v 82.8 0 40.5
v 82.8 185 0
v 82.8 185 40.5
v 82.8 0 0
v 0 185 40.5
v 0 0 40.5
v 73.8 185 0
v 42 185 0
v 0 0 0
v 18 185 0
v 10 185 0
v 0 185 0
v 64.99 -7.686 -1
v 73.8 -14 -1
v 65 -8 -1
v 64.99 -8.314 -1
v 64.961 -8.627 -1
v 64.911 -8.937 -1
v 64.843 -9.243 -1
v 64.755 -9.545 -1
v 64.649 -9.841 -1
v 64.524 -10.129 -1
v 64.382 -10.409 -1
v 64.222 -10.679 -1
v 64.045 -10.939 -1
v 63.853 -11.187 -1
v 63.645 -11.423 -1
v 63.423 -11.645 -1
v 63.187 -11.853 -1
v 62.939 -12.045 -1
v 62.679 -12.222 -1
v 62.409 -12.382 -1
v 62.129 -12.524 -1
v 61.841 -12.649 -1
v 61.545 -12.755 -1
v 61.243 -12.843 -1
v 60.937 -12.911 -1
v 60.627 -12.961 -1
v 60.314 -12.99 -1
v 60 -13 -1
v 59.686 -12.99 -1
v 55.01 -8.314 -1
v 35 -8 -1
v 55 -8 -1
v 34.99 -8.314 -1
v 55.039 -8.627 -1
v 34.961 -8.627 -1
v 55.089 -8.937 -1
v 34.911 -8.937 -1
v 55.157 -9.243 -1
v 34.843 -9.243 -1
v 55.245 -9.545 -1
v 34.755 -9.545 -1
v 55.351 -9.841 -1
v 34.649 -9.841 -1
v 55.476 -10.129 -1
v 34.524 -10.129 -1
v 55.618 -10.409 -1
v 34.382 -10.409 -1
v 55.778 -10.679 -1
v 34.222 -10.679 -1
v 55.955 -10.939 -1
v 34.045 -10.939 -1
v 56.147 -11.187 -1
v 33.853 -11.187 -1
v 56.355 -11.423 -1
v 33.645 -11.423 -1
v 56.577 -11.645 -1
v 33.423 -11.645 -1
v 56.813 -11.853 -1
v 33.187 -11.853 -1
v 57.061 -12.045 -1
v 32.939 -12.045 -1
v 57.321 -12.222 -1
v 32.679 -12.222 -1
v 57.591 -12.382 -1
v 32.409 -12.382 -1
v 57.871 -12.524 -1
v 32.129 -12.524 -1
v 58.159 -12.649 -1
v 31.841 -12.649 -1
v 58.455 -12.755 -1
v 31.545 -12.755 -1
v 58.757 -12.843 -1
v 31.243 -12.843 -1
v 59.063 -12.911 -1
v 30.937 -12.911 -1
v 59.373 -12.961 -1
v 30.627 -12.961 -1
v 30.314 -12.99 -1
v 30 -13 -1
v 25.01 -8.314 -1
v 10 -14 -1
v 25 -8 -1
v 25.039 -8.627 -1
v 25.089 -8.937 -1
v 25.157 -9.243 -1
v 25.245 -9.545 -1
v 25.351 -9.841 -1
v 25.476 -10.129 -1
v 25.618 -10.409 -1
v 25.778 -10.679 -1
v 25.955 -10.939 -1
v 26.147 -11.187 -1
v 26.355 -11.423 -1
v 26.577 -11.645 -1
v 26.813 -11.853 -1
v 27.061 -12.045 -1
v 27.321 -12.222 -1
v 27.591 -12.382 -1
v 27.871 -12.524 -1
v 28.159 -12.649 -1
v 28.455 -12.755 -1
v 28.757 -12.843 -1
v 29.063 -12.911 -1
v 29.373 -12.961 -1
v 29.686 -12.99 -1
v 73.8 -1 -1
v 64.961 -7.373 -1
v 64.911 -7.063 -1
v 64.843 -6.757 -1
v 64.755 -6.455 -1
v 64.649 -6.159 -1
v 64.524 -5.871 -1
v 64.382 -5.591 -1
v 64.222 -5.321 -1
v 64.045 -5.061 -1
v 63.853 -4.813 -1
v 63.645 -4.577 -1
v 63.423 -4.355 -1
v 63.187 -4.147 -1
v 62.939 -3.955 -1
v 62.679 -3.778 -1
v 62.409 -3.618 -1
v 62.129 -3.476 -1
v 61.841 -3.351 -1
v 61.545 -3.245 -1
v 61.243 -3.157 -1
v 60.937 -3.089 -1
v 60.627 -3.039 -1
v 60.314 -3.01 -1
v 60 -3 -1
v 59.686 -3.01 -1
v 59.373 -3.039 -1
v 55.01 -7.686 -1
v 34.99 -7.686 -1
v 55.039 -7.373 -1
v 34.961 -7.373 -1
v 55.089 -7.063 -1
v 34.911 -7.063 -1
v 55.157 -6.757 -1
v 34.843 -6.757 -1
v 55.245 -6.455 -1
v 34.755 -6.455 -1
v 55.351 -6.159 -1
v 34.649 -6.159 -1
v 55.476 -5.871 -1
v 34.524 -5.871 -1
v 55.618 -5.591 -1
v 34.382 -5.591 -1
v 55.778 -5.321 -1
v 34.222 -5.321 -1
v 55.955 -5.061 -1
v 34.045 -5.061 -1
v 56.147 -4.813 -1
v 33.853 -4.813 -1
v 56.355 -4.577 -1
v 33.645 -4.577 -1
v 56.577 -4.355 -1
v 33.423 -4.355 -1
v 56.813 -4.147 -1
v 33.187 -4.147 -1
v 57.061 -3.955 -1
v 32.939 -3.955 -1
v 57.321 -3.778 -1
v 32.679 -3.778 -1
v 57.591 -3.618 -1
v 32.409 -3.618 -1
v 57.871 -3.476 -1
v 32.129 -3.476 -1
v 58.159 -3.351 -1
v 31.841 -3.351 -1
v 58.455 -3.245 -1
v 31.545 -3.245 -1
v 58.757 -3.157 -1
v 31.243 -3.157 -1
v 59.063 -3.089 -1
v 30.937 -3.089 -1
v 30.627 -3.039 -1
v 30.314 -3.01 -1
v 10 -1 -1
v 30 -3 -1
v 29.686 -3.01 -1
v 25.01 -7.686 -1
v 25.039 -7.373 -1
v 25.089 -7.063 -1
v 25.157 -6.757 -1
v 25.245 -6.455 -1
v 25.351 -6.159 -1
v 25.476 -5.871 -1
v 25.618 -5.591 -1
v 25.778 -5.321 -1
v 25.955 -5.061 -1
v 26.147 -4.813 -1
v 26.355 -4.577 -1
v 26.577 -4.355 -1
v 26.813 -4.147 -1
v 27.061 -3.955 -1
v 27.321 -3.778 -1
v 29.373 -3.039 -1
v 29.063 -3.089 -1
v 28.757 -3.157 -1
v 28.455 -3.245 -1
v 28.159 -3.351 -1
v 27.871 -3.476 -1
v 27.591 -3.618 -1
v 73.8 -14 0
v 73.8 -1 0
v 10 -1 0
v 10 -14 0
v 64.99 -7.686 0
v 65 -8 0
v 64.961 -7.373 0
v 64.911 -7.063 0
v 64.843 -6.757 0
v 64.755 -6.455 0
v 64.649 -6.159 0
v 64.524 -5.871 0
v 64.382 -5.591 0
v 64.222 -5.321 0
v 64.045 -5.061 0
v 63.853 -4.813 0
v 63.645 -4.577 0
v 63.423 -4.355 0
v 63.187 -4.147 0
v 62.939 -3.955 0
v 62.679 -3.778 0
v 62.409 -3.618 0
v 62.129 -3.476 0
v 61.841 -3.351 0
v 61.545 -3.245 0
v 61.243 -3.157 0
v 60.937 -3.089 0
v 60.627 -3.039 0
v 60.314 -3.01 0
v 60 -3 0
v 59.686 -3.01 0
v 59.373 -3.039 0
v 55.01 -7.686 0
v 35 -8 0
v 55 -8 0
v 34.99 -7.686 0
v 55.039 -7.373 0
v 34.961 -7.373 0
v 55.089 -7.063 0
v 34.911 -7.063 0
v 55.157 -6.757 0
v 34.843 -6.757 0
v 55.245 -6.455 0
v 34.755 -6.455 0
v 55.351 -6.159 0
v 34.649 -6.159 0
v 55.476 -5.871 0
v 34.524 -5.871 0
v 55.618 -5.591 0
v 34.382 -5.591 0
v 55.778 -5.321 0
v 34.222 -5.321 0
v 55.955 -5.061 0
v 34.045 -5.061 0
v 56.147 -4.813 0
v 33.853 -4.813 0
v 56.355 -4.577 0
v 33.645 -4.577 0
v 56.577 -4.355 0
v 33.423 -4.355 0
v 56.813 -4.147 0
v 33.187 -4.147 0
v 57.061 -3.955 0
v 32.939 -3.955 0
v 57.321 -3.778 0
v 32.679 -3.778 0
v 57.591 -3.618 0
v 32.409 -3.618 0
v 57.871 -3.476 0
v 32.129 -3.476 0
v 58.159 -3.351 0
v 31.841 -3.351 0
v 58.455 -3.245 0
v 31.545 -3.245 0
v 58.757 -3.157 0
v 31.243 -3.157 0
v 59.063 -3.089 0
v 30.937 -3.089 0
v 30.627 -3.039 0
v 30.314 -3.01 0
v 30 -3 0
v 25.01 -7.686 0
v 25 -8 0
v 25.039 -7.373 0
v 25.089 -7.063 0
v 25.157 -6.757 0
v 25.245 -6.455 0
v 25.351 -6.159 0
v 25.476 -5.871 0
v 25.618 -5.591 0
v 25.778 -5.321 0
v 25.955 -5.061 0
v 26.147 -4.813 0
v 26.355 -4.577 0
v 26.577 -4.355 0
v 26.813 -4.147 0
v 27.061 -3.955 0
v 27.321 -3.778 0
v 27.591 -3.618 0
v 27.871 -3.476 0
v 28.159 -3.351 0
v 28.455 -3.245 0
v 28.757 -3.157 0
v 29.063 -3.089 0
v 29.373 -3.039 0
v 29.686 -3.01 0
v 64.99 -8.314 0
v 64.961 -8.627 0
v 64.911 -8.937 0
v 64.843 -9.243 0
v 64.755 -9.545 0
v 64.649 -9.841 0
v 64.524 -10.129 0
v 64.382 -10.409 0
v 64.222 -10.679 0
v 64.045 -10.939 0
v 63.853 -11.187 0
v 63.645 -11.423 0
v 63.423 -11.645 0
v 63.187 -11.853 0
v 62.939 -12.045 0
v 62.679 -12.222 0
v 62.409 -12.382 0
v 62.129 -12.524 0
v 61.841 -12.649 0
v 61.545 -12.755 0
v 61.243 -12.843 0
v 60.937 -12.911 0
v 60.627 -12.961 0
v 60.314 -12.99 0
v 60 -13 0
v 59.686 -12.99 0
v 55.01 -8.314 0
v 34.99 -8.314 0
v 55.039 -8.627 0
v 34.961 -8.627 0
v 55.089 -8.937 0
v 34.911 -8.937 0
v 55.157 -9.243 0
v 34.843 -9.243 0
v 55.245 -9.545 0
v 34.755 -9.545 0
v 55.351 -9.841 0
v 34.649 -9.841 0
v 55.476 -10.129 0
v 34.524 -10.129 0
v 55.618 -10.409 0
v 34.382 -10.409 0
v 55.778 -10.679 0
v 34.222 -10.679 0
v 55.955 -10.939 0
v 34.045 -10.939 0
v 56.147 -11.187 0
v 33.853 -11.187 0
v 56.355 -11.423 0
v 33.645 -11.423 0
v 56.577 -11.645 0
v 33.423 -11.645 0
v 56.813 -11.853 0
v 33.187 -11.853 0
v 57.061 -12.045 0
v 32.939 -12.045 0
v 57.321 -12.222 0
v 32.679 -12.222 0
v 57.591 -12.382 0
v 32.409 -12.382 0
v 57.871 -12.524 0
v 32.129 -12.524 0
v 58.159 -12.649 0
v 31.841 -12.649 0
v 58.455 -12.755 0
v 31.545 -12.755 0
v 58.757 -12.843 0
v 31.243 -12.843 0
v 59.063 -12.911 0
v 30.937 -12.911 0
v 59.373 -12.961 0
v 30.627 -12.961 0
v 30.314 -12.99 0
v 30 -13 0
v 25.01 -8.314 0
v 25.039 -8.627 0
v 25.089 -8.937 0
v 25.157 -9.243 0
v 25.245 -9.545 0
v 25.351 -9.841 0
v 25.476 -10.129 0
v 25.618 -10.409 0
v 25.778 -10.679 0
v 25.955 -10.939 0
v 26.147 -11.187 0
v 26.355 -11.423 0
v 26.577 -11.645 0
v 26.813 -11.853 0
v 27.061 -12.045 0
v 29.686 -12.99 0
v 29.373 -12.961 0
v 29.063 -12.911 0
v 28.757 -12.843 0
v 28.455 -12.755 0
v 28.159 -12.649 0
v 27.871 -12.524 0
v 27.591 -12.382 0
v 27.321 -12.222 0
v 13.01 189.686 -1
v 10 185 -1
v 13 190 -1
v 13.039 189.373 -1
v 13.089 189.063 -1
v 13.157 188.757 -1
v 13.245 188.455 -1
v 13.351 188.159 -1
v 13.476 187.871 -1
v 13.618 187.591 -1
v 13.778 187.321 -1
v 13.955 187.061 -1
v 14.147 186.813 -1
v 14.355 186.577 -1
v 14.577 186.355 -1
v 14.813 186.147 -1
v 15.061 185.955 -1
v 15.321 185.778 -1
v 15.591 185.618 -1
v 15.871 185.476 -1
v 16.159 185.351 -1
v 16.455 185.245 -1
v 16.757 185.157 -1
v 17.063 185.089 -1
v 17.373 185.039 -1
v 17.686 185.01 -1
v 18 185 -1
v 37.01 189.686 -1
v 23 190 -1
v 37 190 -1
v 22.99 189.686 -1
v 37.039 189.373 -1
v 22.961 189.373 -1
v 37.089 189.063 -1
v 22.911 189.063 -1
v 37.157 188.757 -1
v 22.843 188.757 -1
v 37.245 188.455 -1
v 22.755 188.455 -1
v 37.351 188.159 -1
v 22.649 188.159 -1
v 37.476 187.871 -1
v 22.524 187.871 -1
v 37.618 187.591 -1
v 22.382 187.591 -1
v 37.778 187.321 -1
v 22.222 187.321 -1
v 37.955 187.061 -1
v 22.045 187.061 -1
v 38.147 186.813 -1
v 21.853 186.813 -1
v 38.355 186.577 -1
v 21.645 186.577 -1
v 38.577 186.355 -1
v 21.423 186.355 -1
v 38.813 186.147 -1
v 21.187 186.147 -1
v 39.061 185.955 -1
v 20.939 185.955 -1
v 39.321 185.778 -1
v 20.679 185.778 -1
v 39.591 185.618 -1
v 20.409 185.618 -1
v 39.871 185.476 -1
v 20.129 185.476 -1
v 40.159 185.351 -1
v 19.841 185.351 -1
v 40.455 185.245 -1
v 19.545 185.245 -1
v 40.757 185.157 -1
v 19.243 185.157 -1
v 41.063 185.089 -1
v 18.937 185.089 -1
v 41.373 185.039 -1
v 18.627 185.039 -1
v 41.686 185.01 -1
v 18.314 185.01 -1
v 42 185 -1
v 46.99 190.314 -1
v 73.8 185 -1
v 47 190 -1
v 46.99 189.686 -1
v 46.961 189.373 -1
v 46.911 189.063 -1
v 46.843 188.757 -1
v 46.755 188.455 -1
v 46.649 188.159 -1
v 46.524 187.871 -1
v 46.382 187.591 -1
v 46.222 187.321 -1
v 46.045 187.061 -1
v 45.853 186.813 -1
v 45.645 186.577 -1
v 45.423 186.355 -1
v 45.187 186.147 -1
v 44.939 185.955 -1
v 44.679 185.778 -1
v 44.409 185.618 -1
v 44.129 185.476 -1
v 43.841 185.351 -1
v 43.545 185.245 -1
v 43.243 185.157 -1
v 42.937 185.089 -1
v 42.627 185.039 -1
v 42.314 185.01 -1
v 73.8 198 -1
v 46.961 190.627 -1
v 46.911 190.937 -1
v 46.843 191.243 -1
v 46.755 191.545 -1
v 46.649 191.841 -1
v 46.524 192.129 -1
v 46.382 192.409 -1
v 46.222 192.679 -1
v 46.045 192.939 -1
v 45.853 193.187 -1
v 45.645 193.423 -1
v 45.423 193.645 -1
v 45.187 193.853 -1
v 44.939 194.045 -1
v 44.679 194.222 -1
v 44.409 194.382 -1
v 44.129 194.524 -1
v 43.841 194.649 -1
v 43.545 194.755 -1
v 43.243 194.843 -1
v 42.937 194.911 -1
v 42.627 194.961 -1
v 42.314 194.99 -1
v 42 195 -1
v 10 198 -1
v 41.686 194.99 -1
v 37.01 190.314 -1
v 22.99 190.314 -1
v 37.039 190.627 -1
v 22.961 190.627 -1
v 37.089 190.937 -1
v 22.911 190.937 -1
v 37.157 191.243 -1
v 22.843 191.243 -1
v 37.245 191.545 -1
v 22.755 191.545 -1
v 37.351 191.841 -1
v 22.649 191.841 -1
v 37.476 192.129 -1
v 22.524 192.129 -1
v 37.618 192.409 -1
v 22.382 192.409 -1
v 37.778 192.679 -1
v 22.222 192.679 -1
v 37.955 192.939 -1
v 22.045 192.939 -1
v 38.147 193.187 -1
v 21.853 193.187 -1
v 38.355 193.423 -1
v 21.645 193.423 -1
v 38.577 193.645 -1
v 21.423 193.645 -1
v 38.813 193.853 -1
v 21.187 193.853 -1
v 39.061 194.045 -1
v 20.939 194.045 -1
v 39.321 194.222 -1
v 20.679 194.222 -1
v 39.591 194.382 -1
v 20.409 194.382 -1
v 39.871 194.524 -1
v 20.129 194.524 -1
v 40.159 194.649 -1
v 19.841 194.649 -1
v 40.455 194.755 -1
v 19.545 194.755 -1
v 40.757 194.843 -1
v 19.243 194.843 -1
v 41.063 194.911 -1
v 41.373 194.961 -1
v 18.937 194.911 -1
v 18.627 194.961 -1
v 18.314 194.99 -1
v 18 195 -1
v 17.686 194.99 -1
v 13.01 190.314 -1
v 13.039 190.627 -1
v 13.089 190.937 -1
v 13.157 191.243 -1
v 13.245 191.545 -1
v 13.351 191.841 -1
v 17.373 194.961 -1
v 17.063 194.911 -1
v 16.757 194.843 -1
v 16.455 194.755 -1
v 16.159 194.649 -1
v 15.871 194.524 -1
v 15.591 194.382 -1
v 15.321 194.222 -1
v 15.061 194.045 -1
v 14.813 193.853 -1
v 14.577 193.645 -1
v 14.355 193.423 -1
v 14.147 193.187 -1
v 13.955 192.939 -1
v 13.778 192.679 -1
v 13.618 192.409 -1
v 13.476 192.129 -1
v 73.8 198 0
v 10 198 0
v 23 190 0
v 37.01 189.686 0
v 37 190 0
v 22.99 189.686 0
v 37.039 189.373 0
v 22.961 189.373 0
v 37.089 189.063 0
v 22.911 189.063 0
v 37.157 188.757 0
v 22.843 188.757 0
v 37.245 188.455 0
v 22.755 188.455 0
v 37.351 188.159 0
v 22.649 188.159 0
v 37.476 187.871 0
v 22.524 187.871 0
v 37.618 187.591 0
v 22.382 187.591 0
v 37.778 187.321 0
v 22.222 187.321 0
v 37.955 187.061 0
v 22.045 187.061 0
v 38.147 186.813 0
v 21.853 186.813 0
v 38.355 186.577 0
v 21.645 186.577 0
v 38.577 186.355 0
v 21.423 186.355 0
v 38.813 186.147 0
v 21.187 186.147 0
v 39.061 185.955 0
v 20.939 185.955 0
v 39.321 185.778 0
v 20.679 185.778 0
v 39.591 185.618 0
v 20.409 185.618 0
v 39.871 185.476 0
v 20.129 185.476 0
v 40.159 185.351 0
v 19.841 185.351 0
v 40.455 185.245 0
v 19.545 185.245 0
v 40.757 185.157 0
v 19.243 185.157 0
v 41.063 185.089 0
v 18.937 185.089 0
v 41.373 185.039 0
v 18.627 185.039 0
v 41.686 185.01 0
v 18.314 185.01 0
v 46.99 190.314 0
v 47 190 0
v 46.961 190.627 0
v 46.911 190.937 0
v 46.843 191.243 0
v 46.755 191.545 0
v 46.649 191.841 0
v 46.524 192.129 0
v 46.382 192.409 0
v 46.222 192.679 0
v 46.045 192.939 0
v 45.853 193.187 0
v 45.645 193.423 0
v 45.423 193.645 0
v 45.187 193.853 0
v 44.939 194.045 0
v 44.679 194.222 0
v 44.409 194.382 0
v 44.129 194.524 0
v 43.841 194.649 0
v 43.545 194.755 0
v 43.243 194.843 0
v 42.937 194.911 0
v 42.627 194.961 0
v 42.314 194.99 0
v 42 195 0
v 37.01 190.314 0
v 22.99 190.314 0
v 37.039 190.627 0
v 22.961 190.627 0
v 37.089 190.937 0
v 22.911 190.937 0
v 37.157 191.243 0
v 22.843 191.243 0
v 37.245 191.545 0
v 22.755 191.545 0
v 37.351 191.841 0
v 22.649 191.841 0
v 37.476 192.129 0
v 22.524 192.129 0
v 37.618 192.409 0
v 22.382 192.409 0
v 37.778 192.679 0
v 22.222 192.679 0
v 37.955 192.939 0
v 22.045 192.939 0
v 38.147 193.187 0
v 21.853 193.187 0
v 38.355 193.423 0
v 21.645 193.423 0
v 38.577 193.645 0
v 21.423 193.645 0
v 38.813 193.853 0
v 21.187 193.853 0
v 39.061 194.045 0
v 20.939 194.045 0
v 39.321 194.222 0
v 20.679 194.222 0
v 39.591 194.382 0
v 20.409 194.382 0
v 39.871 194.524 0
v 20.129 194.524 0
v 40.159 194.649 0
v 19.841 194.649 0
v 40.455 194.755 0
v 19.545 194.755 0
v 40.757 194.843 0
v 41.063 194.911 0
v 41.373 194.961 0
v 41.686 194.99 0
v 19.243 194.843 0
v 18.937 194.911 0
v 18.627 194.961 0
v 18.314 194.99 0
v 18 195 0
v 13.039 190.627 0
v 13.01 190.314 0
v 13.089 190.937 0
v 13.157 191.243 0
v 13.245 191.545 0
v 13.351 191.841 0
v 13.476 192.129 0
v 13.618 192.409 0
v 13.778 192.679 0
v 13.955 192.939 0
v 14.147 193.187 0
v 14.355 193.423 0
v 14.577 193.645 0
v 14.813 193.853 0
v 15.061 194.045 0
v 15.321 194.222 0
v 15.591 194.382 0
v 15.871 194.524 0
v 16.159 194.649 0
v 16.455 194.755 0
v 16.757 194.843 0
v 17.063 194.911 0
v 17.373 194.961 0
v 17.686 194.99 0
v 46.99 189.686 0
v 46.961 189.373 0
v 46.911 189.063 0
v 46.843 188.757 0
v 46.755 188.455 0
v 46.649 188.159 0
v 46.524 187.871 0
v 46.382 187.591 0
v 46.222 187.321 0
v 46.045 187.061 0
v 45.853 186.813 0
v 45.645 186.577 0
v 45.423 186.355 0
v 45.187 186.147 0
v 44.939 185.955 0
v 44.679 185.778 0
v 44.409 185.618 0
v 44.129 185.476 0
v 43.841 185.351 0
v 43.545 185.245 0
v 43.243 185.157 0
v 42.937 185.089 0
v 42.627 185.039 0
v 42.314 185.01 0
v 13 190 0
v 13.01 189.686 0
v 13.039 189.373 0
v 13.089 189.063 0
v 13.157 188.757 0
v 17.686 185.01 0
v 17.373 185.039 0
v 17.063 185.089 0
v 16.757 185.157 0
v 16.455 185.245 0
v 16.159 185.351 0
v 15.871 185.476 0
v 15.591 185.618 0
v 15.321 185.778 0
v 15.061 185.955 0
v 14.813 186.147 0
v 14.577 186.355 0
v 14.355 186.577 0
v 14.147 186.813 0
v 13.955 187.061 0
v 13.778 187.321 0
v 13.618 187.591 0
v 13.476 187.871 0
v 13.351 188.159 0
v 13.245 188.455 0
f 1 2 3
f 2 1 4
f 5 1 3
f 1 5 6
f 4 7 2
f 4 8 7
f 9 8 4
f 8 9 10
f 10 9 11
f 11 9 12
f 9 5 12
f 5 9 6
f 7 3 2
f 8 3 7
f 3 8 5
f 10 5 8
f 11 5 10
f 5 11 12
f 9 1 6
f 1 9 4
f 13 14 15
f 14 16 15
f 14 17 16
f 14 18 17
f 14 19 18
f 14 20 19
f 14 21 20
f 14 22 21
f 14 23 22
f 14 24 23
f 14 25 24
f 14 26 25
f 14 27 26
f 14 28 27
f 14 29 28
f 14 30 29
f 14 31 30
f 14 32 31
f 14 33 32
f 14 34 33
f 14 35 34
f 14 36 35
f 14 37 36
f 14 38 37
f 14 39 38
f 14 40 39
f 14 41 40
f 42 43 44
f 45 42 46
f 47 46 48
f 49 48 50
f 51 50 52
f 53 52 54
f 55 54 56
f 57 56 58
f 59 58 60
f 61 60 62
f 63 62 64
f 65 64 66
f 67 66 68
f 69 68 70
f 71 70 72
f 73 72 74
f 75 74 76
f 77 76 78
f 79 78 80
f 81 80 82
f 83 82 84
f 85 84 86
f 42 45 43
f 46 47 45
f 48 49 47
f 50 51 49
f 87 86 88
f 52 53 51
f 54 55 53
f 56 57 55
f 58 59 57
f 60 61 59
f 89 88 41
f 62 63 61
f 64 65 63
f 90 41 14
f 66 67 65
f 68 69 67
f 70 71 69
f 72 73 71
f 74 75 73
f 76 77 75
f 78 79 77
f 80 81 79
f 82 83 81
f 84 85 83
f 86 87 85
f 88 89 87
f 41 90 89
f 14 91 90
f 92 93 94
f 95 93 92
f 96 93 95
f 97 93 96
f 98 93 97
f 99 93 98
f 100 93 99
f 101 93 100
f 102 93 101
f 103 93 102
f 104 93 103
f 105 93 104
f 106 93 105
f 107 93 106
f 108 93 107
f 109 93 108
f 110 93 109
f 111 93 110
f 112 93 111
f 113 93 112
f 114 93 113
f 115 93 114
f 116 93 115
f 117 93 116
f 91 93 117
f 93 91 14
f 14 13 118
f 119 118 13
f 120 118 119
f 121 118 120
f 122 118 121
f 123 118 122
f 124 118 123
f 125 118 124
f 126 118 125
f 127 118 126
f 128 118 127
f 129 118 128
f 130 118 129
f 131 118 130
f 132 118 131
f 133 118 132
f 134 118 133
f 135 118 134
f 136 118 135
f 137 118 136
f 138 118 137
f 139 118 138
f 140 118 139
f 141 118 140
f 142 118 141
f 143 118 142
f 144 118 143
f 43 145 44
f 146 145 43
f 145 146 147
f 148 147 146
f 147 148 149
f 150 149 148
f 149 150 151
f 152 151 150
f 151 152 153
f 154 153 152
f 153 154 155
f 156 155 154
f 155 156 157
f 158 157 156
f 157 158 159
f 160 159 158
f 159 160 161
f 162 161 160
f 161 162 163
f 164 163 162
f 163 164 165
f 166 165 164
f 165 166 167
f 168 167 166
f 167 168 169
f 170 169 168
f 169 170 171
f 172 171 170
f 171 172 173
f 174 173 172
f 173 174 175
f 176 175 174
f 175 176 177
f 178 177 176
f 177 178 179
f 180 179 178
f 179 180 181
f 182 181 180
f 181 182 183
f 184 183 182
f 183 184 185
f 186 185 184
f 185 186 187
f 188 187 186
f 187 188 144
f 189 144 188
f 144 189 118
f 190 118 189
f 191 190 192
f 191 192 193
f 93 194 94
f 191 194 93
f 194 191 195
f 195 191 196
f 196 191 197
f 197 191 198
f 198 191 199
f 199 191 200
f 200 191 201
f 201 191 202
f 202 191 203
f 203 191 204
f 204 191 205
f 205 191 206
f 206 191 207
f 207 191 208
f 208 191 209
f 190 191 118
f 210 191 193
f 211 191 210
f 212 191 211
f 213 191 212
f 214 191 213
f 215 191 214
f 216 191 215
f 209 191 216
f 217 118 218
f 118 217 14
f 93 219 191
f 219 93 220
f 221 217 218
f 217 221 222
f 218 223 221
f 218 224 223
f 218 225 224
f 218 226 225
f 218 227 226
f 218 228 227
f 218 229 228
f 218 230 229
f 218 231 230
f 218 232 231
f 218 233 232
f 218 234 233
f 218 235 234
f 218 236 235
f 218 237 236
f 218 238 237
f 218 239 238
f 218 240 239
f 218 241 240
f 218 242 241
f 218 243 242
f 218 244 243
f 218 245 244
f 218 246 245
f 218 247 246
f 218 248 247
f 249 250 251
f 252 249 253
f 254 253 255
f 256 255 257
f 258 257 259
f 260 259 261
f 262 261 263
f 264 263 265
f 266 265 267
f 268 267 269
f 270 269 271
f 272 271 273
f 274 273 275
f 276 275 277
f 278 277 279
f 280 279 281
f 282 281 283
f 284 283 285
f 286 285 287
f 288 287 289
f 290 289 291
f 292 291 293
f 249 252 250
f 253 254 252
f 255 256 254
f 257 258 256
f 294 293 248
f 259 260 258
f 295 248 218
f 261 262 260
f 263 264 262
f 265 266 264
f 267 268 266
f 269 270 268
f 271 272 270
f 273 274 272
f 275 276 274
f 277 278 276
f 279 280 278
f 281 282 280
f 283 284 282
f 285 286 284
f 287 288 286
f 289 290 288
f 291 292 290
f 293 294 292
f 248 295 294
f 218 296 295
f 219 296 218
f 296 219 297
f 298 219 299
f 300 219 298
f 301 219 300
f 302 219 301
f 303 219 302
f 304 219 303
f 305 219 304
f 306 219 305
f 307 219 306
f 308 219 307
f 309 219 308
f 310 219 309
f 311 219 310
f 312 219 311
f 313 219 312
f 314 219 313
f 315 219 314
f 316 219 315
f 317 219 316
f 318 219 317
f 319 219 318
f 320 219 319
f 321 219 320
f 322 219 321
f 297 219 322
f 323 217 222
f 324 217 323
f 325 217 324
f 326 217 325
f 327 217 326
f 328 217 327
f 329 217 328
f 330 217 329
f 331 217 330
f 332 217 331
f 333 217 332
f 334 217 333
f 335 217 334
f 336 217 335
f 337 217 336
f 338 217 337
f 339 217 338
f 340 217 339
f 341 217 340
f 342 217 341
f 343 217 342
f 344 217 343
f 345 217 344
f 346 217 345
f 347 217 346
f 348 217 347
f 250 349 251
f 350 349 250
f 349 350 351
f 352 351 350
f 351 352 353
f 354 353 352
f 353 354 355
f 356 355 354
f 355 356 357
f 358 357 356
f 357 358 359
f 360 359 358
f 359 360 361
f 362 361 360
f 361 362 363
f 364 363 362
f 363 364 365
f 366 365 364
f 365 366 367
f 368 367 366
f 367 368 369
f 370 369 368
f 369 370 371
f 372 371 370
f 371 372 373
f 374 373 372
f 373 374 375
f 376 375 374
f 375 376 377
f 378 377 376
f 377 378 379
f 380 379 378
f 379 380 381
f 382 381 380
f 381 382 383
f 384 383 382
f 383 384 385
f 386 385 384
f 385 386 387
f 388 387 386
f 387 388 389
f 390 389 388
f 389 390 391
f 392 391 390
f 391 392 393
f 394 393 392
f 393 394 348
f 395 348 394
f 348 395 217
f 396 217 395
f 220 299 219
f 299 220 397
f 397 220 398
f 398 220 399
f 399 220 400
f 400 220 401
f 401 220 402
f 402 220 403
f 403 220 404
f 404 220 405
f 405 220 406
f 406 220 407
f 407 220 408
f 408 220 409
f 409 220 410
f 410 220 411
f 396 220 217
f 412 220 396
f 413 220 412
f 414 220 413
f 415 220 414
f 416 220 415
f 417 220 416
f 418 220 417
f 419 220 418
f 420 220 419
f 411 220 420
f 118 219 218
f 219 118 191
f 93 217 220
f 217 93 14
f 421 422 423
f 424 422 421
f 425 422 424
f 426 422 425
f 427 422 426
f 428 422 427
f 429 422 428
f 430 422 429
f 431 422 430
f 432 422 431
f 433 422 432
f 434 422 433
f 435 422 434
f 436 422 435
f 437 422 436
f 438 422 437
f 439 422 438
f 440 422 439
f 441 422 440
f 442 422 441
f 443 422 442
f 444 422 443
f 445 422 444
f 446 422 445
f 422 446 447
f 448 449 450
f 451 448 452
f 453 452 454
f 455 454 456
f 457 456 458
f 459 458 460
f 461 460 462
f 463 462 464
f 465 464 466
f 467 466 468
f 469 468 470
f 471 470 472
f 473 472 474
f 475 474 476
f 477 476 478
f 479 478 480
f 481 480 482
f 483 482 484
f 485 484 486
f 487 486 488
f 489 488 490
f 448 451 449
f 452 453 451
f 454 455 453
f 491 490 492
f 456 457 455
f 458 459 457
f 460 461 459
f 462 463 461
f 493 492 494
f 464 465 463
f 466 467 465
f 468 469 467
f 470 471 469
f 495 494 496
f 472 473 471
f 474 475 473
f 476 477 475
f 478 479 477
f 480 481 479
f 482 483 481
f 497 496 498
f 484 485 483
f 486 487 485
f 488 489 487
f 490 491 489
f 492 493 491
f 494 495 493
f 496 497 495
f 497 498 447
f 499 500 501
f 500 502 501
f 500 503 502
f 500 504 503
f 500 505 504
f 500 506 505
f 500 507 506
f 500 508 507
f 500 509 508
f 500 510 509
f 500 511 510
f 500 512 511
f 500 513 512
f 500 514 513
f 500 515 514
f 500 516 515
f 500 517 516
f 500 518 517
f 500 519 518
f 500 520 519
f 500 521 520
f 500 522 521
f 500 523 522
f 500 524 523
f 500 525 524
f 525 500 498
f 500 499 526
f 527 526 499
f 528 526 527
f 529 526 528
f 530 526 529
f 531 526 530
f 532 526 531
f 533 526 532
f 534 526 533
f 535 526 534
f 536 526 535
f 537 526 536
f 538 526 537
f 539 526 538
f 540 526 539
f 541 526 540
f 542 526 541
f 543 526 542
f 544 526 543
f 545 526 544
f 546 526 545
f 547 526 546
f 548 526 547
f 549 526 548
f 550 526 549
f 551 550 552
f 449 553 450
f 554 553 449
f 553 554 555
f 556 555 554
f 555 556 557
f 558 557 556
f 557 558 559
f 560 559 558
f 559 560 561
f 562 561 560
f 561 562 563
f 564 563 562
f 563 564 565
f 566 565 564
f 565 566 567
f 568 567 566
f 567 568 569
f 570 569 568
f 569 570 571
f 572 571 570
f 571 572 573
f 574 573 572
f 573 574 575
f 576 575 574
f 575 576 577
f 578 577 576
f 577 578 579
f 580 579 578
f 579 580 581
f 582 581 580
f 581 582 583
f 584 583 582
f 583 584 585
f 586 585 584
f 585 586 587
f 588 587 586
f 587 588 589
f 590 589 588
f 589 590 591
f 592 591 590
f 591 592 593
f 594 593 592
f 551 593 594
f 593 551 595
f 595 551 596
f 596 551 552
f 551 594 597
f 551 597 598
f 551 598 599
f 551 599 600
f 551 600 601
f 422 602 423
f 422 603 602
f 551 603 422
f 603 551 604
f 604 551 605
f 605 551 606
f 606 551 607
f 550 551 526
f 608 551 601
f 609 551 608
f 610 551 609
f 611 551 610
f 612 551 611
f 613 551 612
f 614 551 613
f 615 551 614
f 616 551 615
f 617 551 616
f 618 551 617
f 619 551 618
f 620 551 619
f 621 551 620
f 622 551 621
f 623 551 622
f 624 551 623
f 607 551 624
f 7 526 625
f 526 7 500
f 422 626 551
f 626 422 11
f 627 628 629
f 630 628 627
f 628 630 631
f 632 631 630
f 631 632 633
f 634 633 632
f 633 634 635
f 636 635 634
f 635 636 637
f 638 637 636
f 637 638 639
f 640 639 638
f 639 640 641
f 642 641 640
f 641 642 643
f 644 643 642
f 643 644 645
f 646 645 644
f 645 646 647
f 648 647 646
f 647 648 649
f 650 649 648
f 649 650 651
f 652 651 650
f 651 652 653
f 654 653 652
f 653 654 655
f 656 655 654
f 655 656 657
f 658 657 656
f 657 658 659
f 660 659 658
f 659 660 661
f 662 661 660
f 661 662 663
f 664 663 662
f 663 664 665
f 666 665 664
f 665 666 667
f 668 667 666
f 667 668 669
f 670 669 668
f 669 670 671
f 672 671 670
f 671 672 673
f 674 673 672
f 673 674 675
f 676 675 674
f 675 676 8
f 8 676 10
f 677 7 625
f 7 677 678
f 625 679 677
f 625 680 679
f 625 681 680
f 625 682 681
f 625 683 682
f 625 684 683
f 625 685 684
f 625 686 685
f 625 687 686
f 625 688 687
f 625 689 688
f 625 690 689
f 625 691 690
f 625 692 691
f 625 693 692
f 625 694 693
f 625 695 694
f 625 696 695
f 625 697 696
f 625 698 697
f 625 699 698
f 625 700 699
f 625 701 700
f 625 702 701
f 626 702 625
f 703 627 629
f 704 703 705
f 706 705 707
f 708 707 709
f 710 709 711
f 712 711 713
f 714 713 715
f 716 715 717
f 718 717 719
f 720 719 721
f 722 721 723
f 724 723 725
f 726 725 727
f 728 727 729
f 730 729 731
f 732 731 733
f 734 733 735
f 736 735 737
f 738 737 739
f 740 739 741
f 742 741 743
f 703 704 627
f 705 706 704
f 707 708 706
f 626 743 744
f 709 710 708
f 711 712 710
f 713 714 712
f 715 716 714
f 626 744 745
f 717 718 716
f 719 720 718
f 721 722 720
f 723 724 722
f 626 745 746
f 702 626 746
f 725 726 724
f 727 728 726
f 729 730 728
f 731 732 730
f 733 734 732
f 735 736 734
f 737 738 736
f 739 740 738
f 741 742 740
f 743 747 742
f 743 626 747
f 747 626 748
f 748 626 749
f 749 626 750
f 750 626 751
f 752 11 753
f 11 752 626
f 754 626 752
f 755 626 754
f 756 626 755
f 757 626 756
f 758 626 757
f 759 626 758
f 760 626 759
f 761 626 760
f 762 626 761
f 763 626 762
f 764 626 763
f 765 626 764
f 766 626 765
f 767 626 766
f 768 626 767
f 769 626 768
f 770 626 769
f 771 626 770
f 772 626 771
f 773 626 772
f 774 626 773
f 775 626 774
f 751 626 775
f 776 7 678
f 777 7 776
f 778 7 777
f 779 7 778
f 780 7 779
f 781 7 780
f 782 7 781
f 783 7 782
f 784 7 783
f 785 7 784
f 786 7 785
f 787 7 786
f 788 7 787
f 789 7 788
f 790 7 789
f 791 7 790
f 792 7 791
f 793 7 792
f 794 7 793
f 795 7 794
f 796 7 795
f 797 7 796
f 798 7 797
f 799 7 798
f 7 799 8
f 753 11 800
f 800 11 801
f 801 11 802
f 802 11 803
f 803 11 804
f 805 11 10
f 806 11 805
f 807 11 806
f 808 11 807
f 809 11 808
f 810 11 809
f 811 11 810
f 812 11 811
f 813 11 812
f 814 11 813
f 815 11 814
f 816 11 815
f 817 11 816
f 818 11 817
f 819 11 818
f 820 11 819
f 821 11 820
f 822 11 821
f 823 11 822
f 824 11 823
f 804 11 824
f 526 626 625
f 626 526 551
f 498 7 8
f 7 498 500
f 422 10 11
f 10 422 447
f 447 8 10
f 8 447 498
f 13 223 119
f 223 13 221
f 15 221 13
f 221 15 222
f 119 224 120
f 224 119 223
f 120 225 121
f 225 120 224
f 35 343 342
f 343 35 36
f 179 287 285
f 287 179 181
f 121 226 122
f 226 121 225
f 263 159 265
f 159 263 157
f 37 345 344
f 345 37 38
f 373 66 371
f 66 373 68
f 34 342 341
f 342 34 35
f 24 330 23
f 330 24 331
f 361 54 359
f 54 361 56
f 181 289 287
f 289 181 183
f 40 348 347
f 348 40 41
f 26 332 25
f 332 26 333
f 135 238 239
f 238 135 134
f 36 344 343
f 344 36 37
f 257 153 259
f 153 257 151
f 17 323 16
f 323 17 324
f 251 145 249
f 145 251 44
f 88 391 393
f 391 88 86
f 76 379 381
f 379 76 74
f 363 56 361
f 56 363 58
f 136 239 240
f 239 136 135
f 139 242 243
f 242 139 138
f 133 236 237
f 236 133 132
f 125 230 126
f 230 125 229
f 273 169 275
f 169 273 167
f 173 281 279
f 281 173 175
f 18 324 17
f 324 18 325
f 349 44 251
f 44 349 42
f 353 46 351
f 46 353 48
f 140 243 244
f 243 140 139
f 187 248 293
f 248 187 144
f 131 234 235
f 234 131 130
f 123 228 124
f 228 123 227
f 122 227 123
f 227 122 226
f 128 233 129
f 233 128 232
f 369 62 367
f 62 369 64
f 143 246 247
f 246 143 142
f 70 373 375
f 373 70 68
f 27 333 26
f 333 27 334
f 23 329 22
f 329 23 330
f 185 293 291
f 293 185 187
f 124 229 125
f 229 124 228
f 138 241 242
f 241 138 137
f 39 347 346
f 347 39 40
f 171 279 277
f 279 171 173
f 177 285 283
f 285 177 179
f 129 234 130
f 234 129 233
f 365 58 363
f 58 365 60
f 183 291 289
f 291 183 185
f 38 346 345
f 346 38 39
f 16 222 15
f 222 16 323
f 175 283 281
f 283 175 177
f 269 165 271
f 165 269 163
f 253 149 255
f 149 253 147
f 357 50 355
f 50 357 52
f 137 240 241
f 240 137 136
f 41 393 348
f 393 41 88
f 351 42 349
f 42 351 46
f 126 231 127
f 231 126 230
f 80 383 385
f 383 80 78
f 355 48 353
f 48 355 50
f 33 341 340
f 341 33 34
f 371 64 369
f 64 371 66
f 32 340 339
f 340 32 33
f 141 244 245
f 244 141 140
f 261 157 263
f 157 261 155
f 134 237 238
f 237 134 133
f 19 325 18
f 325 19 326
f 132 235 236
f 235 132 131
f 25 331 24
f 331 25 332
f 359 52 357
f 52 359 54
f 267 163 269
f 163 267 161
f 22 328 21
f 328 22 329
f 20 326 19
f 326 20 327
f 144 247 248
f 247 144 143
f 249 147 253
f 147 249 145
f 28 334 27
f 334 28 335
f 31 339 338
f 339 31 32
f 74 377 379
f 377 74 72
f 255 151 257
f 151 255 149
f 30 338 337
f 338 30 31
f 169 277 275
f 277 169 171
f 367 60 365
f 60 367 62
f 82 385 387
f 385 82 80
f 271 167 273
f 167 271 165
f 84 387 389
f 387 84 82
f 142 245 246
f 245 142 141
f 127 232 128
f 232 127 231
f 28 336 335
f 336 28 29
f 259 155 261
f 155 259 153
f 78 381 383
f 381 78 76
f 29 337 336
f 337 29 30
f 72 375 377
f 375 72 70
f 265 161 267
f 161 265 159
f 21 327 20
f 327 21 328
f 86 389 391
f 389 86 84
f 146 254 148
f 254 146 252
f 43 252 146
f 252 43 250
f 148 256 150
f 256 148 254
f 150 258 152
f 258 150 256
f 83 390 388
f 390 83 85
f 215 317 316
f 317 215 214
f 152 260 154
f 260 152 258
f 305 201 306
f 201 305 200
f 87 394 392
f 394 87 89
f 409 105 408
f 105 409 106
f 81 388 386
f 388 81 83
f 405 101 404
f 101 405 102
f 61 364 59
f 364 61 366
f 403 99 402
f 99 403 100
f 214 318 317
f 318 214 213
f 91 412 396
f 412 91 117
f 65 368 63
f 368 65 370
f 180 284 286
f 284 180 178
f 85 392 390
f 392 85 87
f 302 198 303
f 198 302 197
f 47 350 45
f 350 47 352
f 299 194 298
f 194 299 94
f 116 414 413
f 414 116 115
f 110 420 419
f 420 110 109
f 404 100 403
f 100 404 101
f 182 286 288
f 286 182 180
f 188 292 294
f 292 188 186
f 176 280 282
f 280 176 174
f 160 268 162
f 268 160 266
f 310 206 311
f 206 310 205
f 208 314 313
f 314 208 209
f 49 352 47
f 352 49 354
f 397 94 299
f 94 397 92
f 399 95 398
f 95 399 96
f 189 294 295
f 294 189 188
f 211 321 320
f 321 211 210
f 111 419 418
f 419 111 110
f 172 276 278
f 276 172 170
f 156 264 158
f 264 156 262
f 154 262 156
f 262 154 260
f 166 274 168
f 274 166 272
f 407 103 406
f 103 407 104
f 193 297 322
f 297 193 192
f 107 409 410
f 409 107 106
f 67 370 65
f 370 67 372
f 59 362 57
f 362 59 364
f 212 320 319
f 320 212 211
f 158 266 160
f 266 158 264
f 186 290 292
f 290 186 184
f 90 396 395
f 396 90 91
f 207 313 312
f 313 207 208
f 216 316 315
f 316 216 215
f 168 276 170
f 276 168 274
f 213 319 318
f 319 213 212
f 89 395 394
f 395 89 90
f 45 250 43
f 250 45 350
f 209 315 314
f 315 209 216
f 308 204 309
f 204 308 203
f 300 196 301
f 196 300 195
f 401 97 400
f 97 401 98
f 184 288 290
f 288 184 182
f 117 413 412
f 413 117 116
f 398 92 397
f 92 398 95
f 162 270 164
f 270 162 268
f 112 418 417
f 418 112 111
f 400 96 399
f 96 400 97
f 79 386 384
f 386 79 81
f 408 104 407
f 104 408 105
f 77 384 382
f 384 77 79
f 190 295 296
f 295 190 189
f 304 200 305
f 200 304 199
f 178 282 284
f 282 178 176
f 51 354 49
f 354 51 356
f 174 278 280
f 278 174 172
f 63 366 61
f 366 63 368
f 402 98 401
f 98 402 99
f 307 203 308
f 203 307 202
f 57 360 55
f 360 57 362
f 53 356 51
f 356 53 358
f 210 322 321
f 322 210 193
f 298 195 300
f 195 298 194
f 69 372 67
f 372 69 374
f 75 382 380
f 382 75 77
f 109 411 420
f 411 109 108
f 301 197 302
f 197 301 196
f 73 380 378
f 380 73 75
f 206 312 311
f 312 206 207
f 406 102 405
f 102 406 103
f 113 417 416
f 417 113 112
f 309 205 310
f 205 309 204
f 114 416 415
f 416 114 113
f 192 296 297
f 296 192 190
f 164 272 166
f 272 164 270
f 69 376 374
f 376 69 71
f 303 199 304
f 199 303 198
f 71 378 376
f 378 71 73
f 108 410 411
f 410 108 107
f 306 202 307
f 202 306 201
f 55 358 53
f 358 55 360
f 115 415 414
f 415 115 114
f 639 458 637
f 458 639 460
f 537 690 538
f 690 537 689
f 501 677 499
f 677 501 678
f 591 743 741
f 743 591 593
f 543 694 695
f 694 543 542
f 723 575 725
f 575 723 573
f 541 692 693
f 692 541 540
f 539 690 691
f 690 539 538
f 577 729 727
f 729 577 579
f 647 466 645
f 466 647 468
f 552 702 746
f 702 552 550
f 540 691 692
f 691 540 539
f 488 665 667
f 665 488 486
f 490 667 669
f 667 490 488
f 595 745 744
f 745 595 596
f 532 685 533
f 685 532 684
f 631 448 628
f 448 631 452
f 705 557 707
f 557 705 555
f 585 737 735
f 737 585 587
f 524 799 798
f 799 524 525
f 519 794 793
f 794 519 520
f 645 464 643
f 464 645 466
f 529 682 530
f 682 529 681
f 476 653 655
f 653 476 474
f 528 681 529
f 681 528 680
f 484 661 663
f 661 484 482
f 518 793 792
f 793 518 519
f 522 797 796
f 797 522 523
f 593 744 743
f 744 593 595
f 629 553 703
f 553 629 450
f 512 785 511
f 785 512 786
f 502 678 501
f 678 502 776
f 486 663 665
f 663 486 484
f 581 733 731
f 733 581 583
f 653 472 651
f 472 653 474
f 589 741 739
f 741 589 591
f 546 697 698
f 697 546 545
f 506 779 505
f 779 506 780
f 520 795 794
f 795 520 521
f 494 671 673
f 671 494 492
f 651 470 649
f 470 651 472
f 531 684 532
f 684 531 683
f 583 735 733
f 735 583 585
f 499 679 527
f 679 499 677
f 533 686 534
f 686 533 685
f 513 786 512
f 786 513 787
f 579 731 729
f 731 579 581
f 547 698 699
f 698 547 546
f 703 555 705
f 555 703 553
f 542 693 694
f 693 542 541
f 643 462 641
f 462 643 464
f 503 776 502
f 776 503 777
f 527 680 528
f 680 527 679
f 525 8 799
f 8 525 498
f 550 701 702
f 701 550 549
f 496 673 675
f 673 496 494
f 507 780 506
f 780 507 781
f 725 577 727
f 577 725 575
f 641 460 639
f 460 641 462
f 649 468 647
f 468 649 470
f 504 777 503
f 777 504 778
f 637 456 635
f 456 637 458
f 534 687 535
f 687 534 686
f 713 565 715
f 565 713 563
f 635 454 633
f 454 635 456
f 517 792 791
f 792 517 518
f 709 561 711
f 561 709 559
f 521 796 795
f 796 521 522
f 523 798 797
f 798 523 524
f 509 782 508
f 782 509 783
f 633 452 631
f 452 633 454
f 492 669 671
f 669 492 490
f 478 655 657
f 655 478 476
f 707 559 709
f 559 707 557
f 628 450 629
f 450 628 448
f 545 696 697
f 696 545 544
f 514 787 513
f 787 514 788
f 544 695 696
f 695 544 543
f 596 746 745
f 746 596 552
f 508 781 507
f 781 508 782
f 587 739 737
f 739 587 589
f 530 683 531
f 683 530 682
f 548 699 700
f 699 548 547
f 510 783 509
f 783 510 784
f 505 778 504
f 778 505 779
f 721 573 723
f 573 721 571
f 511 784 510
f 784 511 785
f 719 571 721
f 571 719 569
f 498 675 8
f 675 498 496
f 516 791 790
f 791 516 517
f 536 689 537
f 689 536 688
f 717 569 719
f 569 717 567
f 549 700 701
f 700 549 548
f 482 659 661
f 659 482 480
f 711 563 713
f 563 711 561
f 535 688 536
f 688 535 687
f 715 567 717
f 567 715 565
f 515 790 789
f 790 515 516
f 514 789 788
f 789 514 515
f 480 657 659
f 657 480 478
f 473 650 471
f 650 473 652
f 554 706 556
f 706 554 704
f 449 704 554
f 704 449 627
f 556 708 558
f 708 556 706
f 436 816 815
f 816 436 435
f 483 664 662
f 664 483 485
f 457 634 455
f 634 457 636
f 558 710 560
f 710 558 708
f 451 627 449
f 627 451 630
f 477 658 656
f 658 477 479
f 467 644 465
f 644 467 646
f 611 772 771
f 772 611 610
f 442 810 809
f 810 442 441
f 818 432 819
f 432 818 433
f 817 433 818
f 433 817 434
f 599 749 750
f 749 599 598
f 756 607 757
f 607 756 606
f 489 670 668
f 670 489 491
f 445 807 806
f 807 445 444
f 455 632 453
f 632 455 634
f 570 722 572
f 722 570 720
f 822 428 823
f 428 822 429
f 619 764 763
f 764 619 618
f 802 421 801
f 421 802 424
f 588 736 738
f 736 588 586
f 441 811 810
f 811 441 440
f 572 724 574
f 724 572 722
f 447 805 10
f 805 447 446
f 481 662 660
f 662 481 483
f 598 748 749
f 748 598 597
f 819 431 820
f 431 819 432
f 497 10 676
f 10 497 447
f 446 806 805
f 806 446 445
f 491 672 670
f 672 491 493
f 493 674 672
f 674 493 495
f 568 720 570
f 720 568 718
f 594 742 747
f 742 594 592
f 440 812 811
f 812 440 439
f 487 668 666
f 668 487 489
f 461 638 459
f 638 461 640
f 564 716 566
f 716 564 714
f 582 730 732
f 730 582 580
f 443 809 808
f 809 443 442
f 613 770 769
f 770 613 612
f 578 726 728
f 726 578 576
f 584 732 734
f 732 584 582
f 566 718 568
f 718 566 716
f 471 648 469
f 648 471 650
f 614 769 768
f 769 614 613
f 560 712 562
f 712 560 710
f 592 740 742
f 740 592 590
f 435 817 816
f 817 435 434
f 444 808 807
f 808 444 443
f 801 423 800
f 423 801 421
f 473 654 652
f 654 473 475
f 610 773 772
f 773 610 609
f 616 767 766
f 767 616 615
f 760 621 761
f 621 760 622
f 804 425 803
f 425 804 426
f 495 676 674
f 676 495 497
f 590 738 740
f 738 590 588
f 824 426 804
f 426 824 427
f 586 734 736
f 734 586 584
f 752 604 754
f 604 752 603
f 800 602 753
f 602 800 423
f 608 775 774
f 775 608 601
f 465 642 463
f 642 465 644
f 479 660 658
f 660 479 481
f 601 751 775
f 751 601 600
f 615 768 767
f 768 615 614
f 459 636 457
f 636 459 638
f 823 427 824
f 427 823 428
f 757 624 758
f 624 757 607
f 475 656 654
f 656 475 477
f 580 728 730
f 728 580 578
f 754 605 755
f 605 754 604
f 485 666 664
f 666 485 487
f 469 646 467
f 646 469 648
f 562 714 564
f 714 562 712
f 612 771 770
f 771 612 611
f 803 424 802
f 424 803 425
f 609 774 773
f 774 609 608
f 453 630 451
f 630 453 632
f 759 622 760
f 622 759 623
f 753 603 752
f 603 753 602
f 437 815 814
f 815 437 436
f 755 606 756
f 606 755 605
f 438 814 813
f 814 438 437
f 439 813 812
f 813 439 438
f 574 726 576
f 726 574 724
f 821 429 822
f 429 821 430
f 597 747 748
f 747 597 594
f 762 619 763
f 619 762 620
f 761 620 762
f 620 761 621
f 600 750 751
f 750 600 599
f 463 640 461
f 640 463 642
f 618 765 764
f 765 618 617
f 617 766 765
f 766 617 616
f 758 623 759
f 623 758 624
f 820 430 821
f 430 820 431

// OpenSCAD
////////////////////////////////////////////////
/////////////Open SCAD ////////////////////////
/*//////////////////////////////////////////////

date started  ///1.6.2020
date finished
modler Colin
/*


cylinder ([]) ;   sphere();  cube([]);
square ([]);  circle();
*/


///////////////////////////////////////////////
////////////////////////////////////////////////
////////////////////parameters//////////////////
////////////////////////////////////////////////
//globals

width_controler=82.8;
length_controler=40.5;
height_controler=185;

width_controler_attachment=1;
length_controler_attachment=63.8;
height_controler_attachment=13;


////////////////////////////////////////////////
/////////////////////renders////////////////////
///////////////////////////////////////////////
ComplexObject();

////////////////////////////////////////////////
////////////////////modules////////////////////
///////////////////////////////////////////////
//cylinder () ;   sphere();  cube([]);
//square ([]);  circle();


$fn = 100;
//import();

module ComplexObject()
{
difference()
    {



        union()//Add things to object

       {
           cube([width_controler,height_controler,length_controler]);
           translate([10,-14,0]){
               rotate([0,90,0]){
           #cube([width_controler_attachment,height_controler_attachment,length_controler_attachment]);

           }
       }
       translate([10,185,0]){
               rotate([0,90,0]){
           cube([width_controler_attachment,height_controler_attachment,length_controler_attachment]);

           }
       }
}


            union()//Subtract things from object
    {
                   translate([60,-8,-5]){



         #cylinder (10,5,5);


               }
                translate([30,-8,-5]){



         #cylinder (10,5,5);
                }

 translate([42,190,-5]){



         #cylinder (10,5,5);
                }
                translate([18,190,-5]){



                        #cylinder (10,5,5);
                               }
                               translate([18,190,-5]){



                                       #cylinder (10,5,5);
                                              }

}


  }




}
